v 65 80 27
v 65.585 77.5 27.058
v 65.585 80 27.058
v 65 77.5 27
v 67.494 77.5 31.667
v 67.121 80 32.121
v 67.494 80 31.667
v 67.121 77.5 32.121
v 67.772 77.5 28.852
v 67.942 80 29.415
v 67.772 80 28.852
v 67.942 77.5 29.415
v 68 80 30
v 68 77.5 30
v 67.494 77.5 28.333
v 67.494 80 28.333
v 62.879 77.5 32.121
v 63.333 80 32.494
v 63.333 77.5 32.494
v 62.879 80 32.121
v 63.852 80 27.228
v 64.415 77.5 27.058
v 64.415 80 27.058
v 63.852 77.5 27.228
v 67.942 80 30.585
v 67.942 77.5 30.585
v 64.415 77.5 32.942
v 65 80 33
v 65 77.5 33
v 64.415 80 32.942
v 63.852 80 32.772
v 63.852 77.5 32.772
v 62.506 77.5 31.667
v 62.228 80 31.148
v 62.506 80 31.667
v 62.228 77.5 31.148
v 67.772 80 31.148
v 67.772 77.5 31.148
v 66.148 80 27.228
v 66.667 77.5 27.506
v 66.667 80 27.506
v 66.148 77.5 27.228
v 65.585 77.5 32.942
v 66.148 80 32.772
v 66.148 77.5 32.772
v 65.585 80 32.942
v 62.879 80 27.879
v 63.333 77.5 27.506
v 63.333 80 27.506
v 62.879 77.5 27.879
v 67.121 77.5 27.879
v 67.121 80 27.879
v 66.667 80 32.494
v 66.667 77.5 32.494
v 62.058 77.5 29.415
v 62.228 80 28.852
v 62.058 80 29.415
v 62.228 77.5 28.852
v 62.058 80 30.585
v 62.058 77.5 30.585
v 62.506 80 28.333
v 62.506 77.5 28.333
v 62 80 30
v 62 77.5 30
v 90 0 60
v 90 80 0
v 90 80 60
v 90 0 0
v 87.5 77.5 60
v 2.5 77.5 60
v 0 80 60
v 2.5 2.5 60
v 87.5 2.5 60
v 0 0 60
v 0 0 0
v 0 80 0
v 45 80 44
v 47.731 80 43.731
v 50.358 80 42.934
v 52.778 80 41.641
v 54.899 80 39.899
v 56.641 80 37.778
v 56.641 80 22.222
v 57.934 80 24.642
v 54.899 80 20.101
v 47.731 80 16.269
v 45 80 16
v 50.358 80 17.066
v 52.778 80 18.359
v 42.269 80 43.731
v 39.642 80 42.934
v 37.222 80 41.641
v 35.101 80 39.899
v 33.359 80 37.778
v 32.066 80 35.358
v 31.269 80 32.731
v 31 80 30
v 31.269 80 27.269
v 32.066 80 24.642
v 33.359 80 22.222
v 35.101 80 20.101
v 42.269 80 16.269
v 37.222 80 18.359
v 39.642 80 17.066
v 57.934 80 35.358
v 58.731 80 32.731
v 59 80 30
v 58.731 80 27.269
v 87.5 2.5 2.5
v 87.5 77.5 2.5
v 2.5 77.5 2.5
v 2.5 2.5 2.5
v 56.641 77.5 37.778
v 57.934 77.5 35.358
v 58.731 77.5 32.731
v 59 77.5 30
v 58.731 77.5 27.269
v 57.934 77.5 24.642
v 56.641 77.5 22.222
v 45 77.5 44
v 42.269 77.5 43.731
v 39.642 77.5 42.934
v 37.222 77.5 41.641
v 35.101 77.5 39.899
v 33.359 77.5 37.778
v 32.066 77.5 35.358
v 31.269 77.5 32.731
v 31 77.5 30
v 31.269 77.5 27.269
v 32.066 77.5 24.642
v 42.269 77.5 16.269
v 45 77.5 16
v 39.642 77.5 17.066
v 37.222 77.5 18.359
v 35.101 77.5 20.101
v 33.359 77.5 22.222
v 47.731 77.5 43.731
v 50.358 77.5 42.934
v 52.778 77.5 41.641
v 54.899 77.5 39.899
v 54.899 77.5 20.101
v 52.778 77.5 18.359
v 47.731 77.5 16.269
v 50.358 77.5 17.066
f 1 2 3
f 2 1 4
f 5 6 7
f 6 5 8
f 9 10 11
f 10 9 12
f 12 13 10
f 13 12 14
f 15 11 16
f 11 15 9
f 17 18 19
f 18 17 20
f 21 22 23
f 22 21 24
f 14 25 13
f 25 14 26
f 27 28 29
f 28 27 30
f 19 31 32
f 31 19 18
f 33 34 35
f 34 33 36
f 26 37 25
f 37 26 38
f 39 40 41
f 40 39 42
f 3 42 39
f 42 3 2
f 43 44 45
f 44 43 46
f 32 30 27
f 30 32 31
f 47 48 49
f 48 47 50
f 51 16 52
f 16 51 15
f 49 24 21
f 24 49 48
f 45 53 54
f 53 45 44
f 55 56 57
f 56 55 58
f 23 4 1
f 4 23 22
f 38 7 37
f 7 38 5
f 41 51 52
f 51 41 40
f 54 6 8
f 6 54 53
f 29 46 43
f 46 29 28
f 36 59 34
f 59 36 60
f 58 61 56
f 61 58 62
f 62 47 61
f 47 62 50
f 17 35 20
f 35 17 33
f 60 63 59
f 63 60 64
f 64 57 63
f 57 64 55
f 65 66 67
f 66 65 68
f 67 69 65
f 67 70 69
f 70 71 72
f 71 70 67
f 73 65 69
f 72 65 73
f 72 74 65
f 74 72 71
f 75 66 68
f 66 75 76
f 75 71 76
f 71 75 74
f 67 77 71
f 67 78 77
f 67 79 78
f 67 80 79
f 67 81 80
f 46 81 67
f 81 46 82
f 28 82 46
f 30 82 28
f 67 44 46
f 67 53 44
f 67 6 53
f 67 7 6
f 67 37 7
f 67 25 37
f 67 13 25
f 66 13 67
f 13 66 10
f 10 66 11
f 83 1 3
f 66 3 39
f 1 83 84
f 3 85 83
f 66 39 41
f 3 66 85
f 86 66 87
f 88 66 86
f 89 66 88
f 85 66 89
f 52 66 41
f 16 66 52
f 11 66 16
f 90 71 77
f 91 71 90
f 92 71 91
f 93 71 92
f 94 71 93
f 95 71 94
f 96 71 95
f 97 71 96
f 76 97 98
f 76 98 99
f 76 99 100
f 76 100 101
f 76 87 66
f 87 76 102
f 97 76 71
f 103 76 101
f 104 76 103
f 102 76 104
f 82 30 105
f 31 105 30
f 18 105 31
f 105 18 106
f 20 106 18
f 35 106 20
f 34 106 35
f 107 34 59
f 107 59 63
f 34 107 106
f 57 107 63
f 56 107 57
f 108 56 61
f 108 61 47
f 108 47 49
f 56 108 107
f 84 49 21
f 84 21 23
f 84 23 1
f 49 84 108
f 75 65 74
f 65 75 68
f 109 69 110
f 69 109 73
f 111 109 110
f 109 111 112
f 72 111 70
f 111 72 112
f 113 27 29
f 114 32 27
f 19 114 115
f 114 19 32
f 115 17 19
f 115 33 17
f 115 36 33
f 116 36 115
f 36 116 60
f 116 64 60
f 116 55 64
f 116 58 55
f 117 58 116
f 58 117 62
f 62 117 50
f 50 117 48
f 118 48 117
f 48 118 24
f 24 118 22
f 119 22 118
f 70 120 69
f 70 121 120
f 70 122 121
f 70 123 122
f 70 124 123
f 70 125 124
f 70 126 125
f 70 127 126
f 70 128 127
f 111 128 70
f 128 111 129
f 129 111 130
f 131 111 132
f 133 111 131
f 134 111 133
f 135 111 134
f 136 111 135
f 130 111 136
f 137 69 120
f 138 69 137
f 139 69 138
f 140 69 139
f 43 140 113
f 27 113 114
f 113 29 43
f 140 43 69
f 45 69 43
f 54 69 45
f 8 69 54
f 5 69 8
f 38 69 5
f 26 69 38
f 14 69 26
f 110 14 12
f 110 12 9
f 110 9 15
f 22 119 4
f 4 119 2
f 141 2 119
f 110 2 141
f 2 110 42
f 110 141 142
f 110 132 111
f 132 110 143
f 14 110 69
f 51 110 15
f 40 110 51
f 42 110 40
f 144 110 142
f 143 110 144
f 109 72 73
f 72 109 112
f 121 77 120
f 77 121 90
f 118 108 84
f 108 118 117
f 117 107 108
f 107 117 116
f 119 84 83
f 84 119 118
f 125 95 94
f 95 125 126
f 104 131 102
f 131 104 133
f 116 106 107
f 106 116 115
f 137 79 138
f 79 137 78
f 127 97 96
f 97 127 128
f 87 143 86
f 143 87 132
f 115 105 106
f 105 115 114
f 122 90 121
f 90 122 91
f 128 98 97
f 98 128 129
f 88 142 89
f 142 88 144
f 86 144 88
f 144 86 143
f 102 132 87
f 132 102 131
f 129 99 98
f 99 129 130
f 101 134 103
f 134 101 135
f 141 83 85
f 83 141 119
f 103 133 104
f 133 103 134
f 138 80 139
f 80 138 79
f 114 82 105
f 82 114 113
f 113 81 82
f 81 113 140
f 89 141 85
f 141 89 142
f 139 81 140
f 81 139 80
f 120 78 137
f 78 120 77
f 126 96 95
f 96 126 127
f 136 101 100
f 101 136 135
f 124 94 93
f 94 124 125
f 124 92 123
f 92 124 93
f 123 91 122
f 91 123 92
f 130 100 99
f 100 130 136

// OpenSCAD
$fn = 32;

// ----------------------------------------------------------------------
// Vent box: roundvent enclosure
// ----------------------------------------------------------------------

// --- parameters (mm) ---
box_l = 90;               // box length, X
box_w = 80;               // box width, Y
box_h = 60;               // box height, Z
wall_t = 2.5;             // shell wall thickness
vent_d = 28;              // central vent diameter
ring_d = 6;               // ring hole diameter
n_ring = 6;               // holes in the ring
ring_r = 20;              // ring radius
fit_tol = 0.05;           // tolerance for press fits, mm
free_tol = 0.2;           // tolerance for clearance fits, mm

ring_step = 360 / n_ring;  // ring hole angular step

difference() {
  cube([box_l, box_w, box_h]);
  translate([wall_t, wall_t, wall_t])
    cube([box_l - 2 * wall_t, box_w - 2 * wall_t, box_h]);
  translate([box_l / 2, box_w - wall_t - 1, box_h / 2])
    rotate([-90, 0, 0]) cylinder(h = wall_t + 2, d = vent_d);
  for (i = [0 : n_ring - 1])
    translate([box_l / 2, box_w - wall_t - 1, box_h / 2])
      rotate([0, 0, i * ring_step])
        translate([ring_r, 0, 0]) rotate([-90, 0, 0])
          cylinder(h = wall_t + 2, d = ring_d);
}
